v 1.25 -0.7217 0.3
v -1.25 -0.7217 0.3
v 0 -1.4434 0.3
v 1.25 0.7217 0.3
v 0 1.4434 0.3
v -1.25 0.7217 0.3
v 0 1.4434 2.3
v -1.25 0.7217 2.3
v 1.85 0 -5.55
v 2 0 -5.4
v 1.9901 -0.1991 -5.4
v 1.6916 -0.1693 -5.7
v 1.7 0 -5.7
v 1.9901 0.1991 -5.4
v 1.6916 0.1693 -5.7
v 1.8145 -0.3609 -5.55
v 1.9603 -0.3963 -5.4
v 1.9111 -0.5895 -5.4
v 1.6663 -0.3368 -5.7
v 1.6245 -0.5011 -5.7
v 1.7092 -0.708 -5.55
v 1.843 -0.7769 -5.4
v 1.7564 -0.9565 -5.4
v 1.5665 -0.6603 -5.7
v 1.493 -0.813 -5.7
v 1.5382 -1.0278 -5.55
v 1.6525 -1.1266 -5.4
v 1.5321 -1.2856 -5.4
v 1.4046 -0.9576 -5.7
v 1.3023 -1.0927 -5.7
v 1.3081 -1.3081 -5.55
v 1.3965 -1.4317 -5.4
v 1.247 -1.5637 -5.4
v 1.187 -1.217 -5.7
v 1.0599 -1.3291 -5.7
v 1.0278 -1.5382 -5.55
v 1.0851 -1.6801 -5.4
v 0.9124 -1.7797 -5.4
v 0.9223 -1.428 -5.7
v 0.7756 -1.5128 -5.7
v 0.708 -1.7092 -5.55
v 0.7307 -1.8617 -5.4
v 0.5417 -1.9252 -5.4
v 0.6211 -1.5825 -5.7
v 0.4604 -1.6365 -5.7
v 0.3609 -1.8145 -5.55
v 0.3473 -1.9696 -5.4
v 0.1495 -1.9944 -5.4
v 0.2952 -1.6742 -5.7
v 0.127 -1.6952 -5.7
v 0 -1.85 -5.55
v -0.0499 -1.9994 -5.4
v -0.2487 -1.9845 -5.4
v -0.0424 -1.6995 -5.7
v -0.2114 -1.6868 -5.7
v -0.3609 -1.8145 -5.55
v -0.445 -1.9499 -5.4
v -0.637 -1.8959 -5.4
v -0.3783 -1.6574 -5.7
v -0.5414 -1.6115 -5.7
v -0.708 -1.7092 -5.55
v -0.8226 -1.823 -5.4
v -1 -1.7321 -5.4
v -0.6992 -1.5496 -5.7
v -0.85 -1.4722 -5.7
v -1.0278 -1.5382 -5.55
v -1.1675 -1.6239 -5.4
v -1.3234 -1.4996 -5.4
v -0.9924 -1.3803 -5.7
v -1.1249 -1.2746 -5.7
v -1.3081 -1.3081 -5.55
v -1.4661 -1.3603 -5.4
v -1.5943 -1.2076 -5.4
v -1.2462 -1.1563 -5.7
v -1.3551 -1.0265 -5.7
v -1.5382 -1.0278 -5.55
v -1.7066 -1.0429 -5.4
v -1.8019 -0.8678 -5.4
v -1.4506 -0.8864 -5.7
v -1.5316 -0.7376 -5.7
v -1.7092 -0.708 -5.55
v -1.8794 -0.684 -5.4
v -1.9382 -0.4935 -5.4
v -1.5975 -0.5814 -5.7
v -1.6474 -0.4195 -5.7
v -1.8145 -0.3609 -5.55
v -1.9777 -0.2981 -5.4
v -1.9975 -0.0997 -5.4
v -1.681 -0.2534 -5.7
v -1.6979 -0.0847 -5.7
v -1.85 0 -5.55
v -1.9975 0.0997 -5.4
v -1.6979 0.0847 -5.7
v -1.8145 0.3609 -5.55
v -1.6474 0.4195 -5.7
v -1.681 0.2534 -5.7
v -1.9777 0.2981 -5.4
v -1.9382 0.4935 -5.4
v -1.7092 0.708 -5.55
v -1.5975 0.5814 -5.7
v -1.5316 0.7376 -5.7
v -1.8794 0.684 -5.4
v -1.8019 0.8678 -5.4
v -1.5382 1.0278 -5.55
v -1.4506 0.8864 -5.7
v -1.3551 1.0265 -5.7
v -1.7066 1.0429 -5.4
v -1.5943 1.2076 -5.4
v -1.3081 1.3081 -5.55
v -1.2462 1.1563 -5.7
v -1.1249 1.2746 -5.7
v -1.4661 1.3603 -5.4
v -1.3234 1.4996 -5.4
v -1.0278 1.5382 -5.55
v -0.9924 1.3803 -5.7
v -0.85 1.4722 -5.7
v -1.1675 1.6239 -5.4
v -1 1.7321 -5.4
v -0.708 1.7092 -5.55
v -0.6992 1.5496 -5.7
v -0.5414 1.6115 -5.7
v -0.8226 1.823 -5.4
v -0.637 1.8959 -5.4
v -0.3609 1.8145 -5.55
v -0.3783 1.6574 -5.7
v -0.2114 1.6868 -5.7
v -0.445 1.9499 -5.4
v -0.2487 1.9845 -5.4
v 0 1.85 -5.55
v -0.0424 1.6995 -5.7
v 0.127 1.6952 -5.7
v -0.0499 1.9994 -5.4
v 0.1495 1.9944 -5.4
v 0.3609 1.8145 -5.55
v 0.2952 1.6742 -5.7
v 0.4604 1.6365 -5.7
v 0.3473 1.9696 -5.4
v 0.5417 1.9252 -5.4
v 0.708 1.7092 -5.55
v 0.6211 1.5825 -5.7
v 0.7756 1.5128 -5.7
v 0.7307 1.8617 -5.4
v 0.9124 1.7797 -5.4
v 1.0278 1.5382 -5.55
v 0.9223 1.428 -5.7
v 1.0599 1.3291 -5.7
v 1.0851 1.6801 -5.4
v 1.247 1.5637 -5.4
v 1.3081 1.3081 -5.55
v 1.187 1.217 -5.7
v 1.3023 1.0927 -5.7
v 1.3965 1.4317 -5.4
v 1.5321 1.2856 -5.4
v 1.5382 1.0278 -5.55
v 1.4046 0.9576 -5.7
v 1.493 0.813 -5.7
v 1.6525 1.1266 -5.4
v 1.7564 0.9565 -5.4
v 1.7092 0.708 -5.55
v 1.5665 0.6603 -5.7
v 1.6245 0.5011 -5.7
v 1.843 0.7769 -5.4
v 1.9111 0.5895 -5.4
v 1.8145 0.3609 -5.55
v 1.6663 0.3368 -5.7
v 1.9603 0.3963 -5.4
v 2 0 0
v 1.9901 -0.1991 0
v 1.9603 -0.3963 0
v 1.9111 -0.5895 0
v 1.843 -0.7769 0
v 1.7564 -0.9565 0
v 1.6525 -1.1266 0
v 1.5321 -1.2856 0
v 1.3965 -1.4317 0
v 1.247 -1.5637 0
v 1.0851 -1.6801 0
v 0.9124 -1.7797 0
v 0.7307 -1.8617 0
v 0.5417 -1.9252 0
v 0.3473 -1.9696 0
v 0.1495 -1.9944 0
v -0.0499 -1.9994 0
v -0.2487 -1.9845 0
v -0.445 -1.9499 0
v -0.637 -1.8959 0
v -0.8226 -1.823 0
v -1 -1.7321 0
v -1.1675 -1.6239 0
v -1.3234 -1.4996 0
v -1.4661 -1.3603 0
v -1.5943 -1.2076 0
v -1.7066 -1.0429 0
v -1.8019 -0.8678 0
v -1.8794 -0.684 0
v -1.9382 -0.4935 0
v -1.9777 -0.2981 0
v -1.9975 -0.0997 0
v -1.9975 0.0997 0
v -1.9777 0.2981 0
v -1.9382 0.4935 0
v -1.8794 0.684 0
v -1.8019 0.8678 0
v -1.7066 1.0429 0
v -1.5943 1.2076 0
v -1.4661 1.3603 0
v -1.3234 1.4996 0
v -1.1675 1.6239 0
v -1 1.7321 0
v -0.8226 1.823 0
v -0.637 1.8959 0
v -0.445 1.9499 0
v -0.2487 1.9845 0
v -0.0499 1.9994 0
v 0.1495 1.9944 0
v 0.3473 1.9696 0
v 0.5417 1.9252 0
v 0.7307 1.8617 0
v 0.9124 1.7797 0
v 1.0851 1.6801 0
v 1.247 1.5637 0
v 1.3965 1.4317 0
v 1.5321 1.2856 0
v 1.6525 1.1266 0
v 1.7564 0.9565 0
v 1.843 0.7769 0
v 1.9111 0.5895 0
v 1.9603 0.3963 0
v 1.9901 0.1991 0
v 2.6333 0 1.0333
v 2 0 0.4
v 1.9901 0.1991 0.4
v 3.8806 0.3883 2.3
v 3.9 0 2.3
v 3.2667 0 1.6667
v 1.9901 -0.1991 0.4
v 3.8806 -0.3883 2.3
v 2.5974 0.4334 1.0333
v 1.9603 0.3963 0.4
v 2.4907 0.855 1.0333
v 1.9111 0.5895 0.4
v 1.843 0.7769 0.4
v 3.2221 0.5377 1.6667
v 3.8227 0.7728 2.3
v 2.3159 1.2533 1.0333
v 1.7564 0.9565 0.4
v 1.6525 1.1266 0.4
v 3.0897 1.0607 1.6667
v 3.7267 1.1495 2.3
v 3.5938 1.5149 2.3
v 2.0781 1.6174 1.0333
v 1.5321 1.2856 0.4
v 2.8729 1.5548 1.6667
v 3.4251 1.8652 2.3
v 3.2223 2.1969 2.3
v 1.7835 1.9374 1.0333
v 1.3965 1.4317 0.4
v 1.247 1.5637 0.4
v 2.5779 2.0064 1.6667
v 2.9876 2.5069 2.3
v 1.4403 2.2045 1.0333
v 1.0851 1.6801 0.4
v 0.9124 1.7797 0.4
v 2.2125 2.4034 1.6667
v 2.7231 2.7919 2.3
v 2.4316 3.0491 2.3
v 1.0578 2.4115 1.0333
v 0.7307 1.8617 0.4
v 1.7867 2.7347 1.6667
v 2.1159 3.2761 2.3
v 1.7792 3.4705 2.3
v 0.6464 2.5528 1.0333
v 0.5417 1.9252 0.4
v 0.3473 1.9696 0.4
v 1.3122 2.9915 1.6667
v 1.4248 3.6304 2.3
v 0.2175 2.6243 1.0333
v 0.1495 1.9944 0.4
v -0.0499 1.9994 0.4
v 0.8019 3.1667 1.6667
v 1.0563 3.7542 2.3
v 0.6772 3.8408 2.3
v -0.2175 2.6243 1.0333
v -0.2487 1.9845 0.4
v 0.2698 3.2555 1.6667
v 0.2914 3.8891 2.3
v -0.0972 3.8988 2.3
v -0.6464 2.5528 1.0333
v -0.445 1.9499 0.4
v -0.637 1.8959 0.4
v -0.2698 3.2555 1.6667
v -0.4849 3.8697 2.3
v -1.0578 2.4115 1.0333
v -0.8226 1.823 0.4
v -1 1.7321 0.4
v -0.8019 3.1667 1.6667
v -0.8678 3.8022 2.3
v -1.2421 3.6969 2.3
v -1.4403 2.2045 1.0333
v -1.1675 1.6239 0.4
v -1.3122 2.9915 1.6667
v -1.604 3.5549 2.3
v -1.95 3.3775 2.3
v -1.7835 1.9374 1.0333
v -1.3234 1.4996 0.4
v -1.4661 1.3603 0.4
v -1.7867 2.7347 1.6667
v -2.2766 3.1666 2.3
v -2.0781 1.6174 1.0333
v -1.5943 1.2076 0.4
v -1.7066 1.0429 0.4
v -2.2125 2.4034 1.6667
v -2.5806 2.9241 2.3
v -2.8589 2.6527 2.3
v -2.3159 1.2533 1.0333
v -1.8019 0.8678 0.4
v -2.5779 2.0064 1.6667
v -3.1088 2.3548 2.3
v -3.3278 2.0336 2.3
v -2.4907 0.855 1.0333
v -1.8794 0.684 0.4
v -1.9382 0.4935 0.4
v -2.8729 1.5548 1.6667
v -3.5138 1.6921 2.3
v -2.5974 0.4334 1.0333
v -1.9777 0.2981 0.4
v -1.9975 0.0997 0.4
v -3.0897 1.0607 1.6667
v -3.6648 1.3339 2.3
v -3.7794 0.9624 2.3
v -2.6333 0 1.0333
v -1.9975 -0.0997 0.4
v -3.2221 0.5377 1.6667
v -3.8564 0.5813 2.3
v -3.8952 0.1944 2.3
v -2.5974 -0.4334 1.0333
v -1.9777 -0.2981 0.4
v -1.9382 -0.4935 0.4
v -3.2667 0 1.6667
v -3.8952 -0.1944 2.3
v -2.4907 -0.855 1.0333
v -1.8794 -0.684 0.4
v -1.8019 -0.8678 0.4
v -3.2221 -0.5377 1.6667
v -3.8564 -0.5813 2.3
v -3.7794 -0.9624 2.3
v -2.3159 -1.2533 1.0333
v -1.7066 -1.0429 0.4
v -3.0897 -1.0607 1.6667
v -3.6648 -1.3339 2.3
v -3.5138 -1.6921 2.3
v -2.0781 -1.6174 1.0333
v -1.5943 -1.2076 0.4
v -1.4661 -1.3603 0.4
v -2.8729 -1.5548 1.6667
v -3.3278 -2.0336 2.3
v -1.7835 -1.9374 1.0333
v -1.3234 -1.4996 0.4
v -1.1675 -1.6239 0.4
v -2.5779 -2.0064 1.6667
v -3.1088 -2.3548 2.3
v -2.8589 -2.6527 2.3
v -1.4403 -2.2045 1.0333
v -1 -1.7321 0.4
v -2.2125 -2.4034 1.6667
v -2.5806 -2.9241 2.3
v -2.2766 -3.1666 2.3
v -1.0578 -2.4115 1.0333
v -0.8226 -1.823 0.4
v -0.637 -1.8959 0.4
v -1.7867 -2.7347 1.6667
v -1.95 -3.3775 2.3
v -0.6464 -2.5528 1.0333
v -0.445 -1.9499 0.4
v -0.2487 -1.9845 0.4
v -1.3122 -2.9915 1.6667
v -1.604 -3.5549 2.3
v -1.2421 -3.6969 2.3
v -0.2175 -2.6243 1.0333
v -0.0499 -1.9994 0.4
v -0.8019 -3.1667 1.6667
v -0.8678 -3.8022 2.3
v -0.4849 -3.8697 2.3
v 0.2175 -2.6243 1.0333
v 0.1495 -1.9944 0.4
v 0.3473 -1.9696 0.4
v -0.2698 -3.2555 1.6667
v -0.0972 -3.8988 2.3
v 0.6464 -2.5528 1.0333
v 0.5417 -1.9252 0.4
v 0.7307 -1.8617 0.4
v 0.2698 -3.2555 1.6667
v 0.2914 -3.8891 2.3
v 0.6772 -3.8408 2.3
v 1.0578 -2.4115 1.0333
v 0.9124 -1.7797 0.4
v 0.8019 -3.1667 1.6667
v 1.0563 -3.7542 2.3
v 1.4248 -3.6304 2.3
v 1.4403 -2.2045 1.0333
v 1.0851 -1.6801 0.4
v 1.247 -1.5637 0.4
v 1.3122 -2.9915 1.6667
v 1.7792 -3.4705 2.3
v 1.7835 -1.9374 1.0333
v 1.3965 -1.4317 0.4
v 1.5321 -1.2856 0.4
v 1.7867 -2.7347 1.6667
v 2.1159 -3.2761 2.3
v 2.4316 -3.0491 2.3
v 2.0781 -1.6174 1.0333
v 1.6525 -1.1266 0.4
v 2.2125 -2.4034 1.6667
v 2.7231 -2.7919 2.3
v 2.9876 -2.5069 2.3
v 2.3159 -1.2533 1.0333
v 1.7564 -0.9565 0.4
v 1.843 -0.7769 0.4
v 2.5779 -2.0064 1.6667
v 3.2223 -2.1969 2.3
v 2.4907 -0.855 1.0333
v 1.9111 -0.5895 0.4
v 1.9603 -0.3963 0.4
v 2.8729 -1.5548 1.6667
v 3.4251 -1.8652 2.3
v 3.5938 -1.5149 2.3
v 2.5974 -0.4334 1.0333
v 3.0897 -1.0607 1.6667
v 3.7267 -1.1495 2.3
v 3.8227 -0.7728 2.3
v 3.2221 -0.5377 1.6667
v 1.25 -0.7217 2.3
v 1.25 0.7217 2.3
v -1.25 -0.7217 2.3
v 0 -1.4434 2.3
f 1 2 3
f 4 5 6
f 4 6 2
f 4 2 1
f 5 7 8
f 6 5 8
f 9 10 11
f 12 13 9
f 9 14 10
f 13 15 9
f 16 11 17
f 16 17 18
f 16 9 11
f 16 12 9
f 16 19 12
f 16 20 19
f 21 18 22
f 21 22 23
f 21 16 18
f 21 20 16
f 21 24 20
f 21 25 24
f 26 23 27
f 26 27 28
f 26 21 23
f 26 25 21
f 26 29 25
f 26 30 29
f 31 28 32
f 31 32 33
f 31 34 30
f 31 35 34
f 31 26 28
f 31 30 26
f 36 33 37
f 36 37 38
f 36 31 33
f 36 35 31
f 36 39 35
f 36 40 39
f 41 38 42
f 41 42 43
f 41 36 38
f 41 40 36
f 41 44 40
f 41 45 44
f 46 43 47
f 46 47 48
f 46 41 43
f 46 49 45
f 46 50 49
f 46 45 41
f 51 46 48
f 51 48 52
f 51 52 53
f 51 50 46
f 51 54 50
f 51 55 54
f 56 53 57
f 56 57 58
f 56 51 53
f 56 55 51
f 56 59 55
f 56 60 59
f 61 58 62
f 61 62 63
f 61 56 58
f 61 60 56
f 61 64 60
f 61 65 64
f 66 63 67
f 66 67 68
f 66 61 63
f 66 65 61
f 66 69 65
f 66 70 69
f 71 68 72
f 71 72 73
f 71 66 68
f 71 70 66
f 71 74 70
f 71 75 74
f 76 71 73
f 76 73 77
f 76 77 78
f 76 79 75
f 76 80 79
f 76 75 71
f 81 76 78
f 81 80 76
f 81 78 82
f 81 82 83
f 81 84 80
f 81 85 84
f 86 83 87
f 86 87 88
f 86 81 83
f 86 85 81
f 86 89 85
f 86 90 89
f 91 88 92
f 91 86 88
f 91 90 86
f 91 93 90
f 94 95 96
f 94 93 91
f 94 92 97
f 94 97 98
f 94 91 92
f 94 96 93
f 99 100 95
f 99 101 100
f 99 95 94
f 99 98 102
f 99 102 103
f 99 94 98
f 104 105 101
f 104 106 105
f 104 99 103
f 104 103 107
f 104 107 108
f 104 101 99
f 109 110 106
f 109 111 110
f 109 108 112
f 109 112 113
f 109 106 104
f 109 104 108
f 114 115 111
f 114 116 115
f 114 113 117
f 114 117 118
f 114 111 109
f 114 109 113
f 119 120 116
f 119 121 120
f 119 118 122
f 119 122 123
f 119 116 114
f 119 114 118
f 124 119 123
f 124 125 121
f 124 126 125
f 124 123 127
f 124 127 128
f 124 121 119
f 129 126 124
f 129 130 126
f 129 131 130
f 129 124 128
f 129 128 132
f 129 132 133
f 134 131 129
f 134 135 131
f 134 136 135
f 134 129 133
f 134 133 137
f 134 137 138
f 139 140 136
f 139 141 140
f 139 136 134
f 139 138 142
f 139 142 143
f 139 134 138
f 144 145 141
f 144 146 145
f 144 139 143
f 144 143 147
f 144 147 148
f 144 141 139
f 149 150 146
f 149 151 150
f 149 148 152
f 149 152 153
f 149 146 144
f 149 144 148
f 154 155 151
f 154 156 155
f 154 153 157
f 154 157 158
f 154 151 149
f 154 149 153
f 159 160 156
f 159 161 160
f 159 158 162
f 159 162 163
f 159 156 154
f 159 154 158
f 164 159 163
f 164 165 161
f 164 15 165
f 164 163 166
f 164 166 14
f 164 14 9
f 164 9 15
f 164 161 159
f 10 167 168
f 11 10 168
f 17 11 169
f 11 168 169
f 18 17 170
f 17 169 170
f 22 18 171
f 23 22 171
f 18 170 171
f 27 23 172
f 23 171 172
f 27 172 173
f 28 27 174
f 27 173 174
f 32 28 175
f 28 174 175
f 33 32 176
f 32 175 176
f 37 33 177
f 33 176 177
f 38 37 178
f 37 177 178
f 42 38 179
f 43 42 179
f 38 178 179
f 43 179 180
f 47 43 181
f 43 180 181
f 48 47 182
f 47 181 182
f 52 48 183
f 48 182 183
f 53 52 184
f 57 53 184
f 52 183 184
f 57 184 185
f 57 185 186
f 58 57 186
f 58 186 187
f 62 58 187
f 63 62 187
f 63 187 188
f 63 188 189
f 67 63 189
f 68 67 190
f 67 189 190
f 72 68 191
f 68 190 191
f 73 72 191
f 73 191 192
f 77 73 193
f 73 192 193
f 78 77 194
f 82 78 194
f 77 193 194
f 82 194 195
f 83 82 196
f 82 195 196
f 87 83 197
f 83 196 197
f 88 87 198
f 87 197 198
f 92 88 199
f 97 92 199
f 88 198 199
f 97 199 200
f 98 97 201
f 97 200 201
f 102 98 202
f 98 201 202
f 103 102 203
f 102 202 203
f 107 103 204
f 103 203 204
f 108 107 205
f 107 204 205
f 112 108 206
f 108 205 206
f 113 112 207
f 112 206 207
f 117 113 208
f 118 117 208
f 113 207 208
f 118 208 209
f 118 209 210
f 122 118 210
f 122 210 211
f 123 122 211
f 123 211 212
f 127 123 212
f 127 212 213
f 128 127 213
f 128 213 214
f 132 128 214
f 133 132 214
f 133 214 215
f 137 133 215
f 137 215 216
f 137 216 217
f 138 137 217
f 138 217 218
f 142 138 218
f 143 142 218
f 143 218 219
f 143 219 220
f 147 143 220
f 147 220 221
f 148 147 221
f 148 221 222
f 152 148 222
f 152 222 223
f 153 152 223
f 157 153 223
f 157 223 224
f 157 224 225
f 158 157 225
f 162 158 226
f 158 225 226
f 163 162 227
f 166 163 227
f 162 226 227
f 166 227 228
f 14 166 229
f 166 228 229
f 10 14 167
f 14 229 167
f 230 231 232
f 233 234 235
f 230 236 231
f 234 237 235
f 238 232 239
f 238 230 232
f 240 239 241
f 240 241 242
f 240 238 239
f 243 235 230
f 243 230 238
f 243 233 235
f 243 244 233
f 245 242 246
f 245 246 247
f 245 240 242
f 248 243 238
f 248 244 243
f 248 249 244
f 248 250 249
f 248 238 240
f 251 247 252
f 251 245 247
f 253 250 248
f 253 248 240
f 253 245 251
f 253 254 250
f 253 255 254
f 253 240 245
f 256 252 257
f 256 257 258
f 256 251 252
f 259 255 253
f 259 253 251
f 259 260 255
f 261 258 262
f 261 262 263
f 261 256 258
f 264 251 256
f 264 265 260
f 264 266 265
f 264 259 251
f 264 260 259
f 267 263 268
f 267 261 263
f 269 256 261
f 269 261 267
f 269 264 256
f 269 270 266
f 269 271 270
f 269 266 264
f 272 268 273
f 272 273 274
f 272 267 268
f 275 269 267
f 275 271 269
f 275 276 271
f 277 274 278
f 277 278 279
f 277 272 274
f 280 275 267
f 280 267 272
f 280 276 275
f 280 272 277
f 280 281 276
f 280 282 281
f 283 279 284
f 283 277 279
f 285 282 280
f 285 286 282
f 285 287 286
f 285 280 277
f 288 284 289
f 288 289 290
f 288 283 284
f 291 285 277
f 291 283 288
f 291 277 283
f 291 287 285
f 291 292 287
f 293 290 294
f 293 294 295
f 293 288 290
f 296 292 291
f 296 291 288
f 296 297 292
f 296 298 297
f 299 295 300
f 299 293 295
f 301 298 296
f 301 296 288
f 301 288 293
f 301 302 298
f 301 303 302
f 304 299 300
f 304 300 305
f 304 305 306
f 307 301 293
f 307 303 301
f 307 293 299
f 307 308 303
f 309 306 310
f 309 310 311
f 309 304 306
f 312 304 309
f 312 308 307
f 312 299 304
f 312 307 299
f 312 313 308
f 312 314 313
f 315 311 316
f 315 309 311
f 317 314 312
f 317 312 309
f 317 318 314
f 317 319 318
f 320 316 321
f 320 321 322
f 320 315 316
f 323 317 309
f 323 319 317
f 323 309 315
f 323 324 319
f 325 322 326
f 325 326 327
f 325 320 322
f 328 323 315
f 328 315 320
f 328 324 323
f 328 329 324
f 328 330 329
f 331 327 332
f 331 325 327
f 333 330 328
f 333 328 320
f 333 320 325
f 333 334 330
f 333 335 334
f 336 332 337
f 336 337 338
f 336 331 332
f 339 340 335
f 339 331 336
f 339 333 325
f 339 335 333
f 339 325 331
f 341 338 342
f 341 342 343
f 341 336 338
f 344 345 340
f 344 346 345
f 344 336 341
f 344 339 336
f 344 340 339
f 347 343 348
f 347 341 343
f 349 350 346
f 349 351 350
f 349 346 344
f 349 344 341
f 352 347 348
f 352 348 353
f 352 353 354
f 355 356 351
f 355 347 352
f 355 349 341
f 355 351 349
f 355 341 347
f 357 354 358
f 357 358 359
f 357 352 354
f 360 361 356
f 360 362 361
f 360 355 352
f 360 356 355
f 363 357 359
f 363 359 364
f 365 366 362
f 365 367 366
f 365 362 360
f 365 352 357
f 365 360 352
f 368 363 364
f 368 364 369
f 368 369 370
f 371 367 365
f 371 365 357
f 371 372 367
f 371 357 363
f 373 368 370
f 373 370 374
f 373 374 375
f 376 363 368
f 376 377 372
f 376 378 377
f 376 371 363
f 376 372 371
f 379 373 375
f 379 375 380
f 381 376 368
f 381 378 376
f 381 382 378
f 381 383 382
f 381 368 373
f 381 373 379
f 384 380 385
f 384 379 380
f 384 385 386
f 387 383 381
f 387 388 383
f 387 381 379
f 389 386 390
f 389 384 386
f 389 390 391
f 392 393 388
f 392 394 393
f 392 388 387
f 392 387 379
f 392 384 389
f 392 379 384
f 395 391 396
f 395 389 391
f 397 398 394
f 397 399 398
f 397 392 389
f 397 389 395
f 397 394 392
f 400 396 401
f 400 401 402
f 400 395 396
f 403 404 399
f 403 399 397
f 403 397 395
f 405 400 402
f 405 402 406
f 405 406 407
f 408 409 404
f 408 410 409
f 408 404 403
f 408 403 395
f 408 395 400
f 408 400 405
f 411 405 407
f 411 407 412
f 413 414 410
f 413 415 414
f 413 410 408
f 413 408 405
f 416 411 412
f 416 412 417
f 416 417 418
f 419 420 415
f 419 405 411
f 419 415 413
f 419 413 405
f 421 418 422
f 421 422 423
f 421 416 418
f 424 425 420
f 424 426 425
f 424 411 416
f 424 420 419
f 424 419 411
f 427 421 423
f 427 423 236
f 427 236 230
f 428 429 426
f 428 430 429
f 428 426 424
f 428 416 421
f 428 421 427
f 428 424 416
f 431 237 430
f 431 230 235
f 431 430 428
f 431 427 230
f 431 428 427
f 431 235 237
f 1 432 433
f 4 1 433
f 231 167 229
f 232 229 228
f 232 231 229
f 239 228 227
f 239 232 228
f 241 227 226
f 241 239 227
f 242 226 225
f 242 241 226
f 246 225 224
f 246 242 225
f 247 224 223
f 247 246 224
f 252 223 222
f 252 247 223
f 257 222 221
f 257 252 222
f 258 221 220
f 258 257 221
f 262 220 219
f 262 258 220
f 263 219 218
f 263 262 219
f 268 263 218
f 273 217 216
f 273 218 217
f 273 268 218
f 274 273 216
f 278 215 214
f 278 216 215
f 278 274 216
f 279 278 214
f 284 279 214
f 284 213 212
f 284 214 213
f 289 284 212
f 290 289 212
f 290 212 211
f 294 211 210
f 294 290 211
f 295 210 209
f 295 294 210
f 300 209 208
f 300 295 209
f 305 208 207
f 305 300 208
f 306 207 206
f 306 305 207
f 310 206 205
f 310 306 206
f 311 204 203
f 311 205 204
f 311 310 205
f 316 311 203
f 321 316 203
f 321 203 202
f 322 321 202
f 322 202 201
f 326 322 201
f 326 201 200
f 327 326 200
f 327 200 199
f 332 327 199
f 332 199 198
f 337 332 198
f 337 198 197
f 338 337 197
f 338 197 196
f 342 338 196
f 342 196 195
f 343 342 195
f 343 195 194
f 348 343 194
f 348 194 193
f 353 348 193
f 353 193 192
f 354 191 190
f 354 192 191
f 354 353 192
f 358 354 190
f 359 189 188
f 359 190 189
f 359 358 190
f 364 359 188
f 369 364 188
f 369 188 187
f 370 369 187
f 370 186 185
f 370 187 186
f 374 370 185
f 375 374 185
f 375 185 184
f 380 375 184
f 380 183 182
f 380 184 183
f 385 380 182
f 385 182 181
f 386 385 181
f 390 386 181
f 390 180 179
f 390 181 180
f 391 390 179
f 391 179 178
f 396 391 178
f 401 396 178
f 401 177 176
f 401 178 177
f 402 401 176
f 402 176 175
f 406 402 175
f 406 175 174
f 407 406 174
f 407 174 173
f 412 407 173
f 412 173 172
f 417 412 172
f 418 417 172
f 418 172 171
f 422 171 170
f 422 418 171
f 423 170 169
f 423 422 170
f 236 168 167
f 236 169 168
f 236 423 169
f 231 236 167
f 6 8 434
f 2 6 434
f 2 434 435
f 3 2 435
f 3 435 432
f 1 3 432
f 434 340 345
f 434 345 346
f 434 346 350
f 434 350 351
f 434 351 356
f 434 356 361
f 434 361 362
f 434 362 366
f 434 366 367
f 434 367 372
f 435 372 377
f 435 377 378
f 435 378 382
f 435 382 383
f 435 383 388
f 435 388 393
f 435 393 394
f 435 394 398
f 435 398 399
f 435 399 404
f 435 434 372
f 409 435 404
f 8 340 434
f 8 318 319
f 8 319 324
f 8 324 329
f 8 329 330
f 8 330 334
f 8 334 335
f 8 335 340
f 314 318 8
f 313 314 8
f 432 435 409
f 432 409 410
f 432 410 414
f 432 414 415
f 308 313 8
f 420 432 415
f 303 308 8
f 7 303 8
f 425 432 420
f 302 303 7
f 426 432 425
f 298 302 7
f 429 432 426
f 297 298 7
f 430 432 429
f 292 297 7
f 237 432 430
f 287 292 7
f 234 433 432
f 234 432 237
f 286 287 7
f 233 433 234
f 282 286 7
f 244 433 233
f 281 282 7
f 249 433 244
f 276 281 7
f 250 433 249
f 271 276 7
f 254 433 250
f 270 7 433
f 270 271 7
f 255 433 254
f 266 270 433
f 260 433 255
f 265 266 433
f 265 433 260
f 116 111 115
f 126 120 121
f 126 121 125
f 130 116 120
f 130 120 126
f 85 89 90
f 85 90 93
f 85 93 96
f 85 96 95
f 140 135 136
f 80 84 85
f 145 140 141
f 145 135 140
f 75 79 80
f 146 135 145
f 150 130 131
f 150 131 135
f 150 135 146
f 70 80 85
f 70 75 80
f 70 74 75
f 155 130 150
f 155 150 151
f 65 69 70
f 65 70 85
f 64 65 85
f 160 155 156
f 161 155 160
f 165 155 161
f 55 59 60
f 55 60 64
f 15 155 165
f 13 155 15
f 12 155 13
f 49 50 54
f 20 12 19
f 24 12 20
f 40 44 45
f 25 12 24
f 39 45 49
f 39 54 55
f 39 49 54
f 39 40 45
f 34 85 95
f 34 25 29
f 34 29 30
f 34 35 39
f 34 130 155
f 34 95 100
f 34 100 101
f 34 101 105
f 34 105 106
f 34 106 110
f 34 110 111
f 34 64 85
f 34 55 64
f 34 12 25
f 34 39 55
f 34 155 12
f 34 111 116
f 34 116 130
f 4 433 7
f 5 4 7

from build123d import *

# Parameters (mm, degrees)
SKETCH1_R           = 4
BOSS_EXTRUDE1_DEPTH = 2.3
SKETCH2_R           = 2
BOSS_EXTRUDE2_DEPTH = 5.7
CHAMFER1_SIZE       = 0.3
CUT_EXTRUDE1_DEPTH  = 2
CHAMFER2_SIZE       = 2.4


with BuildPart() as part:
    # Sketch1 → Boss-Extrude1 (new body)
    with BuildSketch(Plane.XY):
        Circle(SKETCH1_R)
    extrude(amount=BOSS_EXTRUDE1_DEPTH)

    # Sketch2 → Boss-Extrude2 (add)
    with BuildSketch(Plane(origin=(0, 0, 0), x_dir=(-1, 0, 0), z_dir=(0, 0, -1))):
        with Locations(Location((0, 0, 0), (0, 0, 180))):
            Circle(SKETCH2_R)
    extrude(amount=BOSS_EXTRUDE2_DEPTH)

    # Chamfer1
    chamfer1_edges = [part.edges().sort_by_distance(p)[0] for p in [
        (-2, 0, -5.7),
    ]]
    chamfer(chamfer1_edges, length=CHAMFER1_SIZE)

    # Sketch3 → Cut-Extrude1 (cut)
    with BuildSketch(Plane.XY.offset(2.3)):
        Polygon((0, 1.443375673), (-1.25, 0.721687836), (-1.25, -0.721687836), (0, -1.443375673), (1.25, -0.721687836), (1.25, 0.721687836), align=None)
    extrude(amount=-CUT_EXTRUDE1_DEPTH, mode=Mode.SUBTRACT)

    # Chamfer2
    # the kernel refuses this chamfer: 2.4 mm, written as the material it takes off along each edge
    with BuildSketch(Plane(origin=(0, 0, 0), x_dir=(1, 0, 0), z_dir=(0, -1, 0))) as chamfer2_piece_1_section:
        Polygon((4 - CHAMFER2_SIZE, 0), (4, CHAMFER2_SIZE), (4, 0), align=None)
    chamfer2_piece_1 = revolve(axis=Axis((0, 0, 0), (0, 0, 1)), mode=Mode.PRIVATE)
    chamfer2_piece_1 = chamfer2_piece_1 - Plane(origin=(0, 0, 1.405884102), x_dir=(1, 0, 0), z_dir=(0, 0, 1)) * Cylinder(2, 16, mode=Mode.PRIVATE)
    add(chamfer2_piece_1, mode=Mode.SUBTRACT)


solid = part.part
